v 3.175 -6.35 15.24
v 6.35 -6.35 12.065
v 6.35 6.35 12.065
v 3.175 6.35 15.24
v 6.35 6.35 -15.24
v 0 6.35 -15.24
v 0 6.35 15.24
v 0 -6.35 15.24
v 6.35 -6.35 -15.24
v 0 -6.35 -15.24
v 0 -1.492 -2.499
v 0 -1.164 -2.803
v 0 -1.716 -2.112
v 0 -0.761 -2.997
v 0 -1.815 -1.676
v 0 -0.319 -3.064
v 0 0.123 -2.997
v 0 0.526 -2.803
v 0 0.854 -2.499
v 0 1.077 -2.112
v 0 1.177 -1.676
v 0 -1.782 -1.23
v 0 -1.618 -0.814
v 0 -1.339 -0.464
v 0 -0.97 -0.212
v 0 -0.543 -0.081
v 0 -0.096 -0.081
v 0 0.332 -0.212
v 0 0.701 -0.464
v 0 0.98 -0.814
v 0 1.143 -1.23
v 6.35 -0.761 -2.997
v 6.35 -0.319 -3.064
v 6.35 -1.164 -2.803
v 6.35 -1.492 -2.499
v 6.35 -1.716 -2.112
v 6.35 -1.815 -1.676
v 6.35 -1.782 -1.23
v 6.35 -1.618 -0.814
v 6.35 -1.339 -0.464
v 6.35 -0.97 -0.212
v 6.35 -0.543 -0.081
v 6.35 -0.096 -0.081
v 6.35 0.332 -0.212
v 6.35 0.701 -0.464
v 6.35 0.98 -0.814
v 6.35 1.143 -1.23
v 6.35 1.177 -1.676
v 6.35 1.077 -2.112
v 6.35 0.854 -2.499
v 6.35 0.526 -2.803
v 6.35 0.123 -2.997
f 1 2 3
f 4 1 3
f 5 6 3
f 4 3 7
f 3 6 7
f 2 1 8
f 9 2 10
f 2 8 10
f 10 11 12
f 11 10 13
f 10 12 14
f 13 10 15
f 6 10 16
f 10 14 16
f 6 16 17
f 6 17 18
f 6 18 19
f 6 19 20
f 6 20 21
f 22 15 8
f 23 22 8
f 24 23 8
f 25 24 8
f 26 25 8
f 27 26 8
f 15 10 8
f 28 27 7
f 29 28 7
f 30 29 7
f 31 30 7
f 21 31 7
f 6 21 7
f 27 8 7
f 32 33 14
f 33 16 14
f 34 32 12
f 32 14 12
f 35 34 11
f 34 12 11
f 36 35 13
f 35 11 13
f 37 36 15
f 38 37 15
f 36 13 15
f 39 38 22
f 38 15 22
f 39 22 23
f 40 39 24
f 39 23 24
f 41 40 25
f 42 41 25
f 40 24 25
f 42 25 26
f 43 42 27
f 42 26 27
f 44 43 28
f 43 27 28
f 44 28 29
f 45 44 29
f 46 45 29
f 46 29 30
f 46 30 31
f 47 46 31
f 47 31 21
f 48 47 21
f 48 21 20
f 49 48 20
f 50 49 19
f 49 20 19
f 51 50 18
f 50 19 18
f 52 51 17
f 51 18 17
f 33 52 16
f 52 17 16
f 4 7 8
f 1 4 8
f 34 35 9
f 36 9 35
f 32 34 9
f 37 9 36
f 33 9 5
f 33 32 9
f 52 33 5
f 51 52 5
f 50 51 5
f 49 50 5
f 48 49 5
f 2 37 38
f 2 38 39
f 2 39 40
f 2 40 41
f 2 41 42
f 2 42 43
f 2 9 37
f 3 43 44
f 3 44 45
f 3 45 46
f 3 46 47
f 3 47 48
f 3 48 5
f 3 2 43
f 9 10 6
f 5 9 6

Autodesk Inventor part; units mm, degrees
ref_plane "YZ Plane" through (0, 0, 0) normal (1, 0, 0) x (0, 1, 0)
ref_plane "XZ Plane" through (0, 0, 0) normal (0, 1, 0) x (-1, 0, 0)
ref_plane "XY Plane" through (0, 0, 0) normal (0, 0, 1) x (1, 0, 0)
sketch "Sketch1" plane through (0, 0, 0) normal (1, 0, 0) x (0, 1, 0)
  line L0 (6.35, 15.24) -> (-6.35, 15.24)
  line L1 (-6.35, 15.24) -> (-6.35, -15.24)
  line L2 (-6.35, -15.24) -> (6.35, -15.24)
  line L3 (6.35, -15.24) -> (6.35, 15.24)
  line L4 (6.35, 15.24) -> (-6.35, -15.24) construction
  line L5 (-6.35, 15.24) -> (6.35, -15.24) construction
  point P0 (0, 0)
  dimension "d0" = 12.7
  dimension "d1" = 30.48
extrude "Extrusion1" add sketch "Sketch1" along normal blind 6.35
chamfer "Chamfer1" distance 3.175 angle 45 1 edges at (6.35, 0, 15.24)
sketch "Sketch2" plane through (6.35, 0, 0) normal (1, 0, 0) x (0, 0, -1)
  point P0 (0, 0)
  point P1 (1.5638, -0.3192)
hole "Hole1" at (6.35, -0.3192, -1.5638) direction (-1, 0, 0) diameter 3 end through all
properties part number "Cover_attachment" material "Steel, Mild"
